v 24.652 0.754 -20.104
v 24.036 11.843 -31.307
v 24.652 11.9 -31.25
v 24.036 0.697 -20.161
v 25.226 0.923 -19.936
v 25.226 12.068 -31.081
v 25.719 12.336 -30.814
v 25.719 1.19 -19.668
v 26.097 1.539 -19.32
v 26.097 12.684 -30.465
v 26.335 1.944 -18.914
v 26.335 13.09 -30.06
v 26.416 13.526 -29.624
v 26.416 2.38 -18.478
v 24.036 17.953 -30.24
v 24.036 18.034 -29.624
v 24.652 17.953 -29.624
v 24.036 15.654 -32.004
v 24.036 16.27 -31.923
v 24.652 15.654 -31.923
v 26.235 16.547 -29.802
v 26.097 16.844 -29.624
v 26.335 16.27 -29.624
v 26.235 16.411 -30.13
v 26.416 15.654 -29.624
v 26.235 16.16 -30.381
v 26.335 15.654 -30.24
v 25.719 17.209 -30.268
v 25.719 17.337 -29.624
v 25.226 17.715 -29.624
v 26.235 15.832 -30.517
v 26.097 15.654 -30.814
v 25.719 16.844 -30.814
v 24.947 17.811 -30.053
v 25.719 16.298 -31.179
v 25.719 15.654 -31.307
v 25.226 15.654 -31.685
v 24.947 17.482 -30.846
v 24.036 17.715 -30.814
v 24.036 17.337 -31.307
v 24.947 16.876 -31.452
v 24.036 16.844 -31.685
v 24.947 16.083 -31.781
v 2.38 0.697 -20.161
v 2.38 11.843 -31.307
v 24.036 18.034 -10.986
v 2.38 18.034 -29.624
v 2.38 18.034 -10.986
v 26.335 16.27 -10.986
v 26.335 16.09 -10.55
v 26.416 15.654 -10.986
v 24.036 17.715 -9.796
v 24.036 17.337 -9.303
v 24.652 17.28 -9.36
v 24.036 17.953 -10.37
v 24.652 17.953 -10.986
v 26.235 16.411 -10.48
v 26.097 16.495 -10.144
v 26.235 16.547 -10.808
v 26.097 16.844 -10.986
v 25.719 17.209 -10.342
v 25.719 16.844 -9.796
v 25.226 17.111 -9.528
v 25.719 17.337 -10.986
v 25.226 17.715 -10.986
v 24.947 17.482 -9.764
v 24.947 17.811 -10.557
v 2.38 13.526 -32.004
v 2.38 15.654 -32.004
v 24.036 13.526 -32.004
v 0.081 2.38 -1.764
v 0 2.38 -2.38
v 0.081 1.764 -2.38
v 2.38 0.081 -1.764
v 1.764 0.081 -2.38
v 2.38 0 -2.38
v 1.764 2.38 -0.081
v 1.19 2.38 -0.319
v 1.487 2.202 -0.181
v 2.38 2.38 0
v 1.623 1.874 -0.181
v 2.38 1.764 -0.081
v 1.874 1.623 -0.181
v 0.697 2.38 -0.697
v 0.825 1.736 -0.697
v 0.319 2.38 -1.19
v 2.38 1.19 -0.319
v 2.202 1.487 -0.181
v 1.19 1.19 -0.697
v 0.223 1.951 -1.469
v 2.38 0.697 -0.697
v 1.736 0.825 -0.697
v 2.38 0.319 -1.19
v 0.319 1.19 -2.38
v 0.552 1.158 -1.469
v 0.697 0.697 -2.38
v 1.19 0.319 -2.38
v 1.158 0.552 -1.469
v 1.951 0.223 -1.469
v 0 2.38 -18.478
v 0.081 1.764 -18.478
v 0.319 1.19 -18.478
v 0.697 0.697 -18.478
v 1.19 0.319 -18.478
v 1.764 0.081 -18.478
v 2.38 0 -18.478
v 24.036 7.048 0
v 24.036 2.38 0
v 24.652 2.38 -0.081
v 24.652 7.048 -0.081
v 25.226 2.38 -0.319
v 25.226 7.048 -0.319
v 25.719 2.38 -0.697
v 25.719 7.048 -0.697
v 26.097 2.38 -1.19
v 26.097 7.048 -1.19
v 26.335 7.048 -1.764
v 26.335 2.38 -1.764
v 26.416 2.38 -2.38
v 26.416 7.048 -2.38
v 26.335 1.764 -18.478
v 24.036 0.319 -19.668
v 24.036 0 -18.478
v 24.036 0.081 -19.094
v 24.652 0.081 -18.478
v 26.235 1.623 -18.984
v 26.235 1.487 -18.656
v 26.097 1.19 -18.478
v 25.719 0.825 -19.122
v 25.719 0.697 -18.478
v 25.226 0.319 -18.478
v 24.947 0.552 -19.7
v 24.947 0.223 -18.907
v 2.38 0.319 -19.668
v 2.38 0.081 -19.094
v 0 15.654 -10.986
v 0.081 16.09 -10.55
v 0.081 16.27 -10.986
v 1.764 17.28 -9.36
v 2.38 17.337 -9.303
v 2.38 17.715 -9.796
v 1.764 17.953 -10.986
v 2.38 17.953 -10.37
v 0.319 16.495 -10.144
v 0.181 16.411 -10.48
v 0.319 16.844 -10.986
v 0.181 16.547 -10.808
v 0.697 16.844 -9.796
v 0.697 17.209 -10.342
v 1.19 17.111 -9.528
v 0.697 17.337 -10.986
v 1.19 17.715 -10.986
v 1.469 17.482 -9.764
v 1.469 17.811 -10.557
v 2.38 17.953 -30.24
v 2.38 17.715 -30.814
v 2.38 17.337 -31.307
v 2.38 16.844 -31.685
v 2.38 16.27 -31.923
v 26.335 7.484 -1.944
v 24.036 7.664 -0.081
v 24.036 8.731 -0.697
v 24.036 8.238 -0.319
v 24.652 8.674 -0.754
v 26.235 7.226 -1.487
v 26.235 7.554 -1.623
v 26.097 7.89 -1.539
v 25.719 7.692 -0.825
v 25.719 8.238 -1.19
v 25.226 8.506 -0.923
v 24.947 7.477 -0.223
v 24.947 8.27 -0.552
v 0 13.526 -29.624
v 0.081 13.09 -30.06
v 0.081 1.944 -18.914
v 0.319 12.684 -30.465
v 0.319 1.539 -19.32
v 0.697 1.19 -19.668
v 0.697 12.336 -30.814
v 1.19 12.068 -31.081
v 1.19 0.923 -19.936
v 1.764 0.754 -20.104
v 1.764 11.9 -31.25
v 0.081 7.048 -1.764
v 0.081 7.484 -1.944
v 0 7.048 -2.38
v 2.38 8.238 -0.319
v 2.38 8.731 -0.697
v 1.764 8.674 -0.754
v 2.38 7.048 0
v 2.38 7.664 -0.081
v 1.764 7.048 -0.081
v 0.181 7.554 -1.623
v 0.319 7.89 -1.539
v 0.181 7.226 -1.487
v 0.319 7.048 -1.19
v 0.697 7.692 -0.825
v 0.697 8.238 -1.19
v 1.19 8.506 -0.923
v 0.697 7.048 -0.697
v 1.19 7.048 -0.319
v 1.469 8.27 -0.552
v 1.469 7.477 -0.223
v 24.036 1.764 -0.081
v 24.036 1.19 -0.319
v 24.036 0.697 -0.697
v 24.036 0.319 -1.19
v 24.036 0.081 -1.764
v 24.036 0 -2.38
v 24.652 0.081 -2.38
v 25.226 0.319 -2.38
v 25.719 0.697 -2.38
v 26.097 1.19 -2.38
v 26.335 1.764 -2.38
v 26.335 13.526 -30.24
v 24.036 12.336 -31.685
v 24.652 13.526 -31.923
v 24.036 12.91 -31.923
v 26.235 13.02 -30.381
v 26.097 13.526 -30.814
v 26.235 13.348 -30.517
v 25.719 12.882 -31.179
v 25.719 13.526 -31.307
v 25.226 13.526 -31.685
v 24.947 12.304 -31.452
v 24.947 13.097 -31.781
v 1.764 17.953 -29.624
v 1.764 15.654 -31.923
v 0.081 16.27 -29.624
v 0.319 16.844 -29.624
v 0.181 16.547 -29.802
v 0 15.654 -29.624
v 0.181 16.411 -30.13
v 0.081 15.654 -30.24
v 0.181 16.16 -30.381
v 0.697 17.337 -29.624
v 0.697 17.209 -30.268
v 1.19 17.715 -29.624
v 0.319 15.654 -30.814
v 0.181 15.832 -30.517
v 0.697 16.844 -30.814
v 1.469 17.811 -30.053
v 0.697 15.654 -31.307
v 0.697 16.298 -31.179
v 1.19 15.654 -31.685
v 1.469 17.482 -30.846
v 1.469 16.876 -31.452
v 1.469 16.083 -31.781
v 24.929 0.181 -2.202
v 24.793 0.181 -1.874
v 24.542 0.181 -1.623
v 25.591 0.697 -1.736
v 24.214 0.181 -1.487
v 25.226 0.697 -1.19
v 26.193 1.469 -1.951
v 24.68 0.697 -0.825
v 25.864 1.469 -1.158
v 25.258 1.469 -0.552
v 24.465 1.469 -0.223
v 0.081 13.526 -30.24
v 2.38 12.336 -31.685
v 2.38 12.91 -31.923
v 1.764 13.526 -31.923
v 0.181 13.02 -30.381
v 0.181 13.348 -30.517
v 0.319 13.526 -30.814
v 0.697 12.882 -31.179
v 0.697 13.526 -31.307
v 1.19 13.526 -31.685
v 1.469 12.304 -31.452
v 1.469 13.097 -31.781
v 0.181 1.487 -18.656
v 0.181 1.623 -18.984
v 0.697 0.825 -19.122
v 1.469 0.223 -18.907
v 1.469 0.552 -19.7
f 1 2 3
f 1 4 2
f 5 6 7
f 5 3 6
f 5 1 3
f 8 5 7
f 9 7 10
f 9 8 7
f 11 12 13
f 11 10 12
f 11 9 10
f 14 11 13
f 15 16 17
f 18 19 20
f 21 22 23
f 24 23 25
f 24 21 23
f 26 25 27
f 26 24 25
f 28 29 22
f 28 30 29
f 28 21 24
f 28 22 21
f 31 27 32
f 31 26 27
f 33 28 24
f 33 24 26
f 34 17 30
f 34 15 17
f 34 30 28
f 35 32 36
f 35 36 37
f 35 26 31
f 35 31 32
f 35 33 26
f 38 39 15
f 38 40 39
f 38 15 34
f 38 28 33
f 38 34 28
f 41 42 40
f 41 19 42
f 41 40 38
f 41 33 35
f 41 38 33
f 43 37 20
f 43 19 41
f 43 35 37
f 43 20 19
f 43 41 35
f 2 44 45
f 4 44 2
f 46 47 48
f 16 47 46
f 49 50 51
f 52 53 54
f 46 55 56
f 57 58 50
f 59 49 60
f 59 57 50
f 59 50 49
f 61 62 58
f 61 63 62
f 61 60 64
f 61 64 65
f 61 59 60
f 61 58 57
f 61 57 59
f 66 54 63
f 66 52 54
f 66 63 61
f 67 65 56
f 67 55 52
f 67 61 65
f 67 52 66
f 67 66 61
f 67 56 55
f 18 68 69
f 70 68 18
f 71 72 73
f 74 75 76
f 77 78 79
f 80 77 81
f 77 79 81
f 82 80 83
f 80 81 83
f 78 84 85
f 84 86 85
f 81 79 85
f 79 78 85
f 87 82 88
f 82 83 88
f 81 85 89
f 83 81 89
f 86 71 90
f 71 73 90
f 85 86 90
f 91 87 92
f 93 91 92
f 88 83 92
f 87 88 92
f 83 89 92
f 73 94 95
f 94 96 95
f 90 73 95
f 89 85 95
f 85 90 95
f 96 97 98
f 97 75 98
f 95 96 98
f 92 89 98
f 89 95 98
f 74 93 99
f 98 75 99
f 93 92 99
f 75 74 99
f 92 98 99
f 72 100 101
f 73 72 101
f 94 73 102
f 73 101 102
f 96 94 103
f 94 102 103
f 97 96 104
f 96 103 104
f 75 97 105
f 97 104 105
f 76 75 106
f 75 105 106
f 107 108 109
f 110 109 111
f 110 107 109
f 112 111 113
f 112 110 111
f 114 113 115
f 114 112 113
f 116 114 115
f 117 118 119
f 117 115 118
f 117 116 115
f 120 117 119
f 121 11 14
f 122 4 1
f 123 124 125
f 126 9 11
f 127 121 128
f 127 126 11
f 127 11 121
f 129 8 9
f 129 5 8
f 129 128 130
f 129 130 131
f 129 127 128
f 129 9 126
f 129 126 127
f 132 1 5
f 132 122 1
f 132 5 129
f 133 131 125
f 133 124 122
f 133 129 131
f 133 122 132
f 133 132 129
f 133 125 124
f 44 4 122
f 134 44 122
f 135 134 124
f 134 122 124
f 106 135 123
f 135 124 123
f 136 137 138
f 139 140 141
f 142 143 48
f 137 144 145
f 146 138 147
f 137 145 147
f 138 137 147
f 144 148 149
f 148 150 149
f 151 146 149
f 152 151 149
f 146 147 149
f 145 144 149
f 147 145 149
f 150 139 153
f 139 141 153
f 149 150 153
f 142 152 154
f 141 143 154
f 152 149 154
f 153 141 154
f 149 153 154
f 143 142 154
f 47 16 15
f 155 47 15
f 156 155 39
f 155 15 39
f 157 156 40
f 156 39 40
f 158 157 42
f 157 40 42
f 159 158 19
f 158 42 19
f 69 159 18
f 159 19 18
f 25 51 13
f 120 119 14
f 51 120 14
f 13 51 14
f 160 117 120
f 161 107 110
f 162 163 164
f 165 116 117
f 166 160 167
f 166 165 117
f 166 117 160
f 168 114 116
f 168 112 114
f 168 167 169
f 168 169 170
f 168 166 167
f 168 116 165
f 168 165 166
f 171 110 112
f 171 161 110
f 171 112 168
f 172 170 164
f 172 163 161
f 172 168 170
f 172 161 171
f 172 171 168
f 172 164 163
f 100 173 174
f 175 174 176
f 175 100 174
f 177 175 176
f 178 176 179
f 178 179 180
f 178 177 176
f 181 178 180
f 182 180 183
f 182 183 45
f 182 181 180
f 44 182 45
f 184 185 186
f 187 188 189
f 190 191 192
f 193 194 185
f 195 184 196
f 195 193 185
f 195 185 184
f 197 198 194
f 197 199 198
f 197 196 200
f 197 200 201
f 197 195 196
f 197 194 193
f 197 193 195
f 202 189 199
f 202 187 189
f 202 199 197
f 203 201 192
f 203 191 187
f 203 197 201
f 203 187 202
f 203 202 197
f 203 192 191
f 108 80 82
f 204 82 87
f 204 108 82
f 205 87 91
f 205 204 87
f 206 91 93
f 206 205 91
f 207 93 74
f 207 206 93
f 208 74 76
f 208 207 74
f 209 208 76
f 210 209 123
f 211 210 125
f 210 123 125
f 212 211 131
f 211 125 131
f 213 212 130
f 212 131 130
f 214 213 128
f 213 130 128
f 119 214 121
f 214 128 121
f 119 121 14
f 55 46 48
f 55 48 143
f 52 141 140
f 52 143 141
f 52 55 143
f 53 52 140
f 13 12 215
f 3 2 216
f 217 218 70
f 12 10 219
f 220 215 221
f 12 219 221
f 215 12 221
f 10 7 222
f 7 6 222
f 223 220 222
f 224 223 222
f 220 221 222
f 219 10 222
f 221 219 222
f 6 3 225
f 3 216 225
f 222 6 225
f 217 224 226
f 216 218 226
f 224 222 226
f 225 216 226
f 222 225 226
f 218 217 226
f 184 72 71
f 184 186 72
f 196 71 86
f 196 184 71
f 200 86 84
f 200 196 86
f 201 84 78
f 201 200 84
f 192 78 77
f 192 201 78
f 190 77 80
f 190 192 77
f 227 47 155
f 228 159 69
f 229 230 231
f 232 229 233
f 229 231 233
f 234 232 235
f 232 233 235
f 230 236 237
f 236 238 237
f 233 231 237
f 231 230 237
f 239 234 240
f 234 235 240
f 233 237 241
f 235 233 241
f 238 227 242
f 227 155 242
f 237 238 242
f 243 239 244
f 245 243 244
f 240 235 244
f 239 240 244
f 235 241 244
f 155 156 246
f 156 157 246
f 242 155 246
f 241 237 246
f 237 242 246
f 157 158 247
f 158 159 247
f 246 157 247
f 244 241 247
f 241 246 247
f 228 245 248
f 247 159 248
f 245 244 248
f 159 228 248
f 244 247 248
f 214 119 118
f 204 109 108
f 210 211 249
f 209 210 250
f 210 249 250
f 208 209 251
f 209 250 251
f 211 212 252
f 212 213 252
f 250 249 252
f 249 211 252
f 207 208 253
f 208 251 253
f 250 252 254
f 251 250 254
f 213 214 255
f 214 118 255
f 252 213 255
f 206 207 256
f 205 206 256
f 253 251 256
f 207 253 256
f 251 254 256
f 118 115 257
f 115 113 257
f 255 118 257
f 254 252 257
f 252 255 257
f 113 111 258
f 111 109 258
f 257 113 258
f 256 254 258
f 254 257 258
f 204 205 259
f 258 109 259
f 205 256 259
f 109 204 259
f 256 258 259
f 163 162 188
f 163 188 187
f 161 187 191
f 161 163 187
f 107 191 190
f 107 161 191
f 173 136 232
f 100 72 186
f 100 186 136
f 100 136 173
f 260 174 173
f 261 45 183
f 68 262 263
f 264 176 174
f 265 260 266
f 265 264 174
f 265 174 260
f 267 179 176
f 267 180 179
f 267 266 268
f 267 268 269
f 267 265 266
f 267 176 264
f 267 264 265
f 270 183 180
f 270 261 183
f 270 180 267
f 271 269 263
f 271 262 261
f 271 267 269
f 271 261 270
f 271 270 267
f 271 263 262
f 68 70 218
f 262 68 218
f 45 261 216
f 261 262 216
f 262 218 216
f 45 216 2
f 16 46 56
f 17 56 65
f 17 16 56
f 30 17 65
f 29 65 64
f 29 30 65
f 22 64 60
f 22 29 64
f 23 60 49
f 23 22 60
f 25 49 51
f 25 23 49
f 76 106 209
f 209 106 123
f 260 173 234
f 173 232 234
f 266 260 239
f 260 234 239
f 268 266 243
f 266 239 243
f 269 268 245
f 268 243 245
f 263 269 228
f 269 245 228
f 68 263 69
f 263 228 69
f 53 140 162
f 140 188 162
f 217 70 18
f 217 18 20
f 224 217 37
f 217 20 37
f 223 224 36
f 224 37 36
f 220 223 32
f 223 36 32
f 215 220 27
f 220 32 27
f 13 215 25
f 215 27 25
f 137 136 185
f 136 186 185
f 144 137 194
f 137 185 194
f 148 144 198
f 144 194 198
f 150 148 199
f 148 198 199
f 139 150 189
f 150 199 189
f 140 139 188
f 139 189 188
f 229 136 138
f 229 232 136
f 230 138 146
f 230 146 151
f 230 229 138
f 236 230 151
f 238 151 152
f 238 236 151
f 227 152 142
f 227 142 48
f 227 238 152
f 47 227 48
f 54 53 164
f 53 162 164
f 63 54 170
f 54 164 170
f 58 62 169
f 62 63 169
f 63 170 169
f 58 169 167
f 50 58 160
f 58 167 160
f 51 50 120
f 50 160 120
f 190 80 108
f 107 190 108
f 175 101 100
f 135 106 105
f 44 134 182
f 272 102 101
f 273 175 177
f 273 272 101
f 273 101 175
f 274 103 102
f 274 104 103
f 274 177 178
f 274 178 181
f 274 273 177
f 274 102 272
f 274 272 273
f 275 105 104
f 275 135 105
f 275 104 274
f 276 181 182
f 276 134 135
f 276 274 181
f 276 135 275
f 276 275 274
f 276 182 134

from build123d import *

# Parameters (mm, degrees)
SKETCH1_W           = 26.416
SKETCH1_H           = 32.004
BOSS_EXTRUDE1_DEPTH = 18.034
CHAMFER1_SIZE       = 12.54
CHAMFER2_SIZE       = 10
FILLET1_R           = 2.38


with BuildPart() as part:
    # Sketch1 → Boss-Extrude1 (new body)
    with BuildSketch(Plane(origin=(0, 0, 0), x_dir=(1, 0, 0), z_dir=(0, 1, 0))):
        with Locations((13.208, 16.002)):
            Rectangle(SKETCH1_W, SKETCH1_H)
    extrude(amount=BOSS_EXTRUDE1_DEPTH)

    # Chamfer1
    chamfer1_edges = [part.edges().sort_by_distance(p)[0] for p in [
        (13.208, 0, -32.004),
    ]]
    chamfer(chamfer1_edges, length=CHAMFER1_SIZE)

    # Chamfer2
    chamfer2_edges = [part.edges().sort_by_distance(p)[0] for p in [
        (13.208, 18.034, 0),
    ]]
    chamfer(chamfer2_edges, length=CHAMFER2_SIZE)

    # Fillet1
    fillet1_edges = [part.edges().sort_by_distance(p)[0] for p in [
        (13.208, 12.54, -32.004),
        (0, 0, -9.732),
        (0, 6.27, -25.734),
        (13.208, 0, -19.464),
        (26.416, 6.27, -25.734),
        (13.208, 18.034, -32.004),
        (26.416, 18.034, -21.002),
        (13.208, 18.034, -10),
        (26.416, 4.017, 0),
        (26.416, 13.034, -5),
        (0, 4.017, 0),
        (13.208, 8.034, 0),
        (0, 13.034, -5),
        (0, 18.034, -21.002),
        (26.416, 0, -9.732),
        (13.208, 0, 0),
        (0, 15.287, -32.004),
        (26.416, 15.287, -32.004),
    ]]
    fillet(fillet1_edges, radius=FILLET1_R)


solid = part.part
